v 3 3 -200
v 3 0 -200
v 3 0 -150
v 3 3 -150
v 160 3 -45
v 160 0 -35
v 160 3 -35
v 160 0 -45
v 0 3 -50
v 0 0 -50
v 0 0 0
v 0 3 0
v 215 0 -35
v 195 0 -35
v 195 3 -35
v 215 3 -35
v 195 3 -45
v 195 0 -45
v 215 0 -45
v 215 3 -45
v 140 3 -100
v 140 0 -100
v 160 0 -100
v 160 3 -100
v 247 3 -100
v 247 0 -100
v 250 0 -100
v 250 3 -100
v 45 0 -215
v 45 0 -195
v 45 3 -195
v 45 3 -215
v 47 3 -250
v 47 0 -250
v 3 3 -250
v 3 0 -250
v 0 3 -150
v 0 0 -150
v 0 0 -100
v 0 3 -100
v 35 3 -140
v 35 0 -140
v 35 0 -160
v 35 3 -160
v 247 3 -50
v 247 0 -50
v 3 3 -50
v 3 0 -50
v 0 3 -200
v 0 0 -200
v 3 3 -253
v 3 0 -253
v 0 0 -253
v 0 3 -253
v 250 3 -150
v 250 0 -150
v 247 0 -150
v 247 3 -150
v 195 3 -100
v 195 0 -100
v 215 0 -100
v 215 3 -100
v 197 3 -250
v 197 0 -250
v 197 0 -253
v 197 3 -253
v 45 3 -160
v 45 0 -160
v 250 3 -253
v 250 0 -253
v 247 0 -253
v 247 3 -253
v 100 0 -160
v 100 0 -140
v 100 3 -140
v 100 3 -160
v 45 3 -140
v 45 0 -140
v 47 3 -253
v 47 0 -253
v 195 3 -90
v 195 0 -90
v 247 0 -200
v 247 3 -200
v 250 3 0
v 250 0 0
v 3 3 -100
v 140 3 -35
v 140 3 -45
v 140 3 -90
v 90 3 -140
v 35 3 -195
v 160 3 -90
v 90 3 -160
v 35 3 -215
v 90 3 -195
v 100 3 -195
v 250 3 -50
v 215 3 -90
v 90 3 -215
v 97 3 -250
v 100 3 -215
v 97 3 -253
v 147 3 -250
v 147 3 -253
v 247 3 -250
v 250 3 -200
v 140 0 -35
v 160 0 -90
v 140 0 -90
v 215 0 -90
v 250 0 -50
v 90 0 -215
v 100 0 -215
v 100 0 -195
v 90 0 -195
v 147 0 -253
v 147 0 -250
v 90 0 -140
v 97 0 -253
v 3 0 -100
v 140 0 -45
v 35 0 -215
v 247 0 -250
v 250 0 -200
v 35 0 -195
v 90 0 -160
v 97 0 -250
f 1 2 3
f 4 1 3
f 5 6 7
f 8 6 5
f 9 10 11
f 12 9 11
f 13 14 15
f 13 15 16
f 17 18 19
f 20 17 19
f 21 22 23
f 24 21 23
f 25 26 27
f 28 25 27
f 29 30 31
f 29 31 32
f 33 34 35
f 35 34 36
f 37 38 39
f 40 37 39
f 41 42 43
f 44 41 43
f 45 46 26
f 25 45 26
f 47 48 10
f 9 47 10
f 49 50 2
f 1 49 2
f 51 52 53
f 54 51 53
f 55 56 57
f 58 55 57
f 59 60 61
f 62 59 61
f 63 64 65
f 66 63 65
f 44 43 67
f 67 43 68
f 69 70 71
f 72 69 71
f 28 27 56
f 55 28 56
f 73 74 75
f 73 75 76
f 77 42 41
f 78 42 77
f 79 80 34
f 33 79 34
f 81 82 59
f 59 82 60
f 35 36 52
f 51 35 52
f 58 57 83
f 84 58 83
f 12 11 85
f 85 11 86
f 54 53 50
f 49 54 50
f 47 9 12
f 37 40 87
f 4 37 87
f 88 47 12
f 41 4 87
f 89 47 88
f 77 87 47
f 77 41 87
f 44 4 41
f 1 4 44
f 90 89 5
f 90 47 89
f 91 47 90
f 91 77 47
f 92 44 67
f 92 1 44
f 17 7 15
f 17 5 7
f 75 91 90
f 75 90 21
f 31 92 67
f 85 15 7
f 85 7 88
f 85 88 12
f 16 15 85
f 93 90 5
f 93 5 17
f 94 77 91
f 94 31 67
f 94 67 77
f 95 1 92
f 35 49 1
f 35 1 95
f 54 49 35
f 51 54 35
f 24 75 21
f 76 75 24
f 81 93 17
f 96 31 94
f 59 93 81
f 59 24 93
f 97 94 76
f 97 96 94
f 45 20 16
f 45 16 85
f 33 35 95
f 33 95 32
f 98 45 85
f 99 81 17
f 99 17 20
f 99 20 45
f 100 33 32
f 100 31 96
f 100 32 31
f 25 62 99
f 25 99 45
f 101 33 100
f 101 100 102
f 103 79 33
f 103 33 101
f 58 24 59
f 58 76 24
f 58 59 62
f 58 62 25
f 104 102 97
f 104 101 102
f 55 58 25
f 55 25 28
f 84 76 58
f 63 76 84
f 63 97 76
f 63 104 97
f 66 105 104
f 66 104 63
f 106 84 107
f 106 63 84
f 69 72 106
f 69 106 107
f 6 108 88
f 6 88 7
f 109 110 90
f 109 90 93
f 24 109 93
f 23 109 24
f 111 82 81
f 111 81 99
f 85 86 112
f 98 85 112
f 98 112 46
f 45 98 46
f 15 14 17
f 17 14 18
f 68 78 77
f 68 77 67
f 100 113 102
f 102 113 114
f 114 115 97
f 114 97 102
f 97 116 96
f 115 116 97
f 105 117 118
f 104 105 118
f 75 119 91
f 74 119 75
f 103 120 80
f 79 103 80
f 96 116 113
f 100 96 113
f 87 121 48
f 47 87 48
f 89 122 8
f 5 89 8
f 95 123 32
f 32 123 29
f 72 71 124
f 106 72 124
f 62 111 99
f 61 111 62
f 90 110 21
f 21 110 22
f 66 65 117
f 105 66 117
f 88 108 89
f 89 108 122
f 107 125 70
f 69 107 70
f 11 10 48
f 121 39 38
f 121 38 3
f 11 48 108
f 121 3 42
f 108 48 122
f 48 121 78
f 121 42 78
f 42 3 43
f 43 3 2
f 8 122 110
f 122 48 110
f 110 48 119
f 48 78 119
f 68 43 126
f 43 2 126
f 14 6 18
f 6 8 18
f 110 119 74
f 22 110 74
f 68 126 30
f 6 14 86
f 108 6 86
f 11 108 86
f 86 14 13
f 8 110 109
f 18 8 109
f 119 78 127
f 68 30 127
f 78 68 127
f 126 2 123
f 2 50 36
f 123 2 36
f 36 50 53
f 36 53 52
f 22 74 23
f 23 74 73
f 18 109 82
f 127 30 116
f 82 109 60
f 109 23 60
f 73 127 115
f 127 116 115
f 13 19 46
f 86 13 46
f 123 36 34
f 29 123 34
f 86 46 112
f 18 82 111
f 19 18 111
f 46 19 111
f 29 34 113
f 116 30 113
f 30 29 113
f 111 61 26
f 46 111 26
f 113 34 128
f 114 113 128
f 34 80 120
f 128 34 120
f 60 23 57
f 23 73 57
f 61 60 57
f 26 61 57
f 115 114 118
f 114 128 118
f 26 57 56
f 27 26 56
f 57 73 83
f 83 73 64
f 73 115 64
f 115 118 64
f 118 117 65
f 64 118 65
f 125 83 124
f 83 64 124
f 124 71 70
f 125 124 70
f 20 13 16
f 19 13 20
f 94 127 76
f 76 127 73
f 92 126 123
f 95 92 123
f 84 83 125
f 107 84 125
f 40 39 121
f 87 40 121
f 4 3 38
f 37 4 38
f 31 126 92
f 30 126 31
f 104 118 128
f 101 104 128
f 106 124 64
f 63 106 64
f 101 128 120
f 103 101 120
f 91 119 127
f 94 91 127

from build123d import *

# Parameters (mm, degrees)
SKETCH1_W           = 10
SKETCH1_H           = 20
SKETCH1_W_2         = 20
SKETCH1_H_2         = 10
BOSS_EXTRUDE1_DEPTH = 3


with BuildPart() as part:
    # Sketch1 → Boss-Extrude1 (new body)
    with BuildSketch(Plane(origin=(0, 0, 0), x_dir=(1, 0, 0), z_dir=(0, 1, 0))):
        Polygon((250, 100), (250, 150), (247, 150), (247, 200), (250, 200), (250, 250), (250, 253), (247, 253), (247, 250), (197, 250), (197, 253), (147, 253), (147, 250), (97, 250), (97, 253), (47, 253), (47, 250), (3, 250), (3, 253), (0, 253), (0, 250), (0, 200), (3, 200), (3, 150), (0, 150), (0, 100), (3, 100), (3, 50), (0, 50), (0, 0), (250, 0), (250, 50), (247, 50), (247, 100), align=None)
        with Locations((95, 150)):
            Rectangle(SKETCH1_W, SKETCH1_H, mode=Mode.SUBTRACT)
        with Locations((40, 150)):
            Rectangle(SKETCH1_W, SKETCH1_H, mode=Mode.SUBTRACT)
        with Locations((205, 95)):
            Rectangle(SKETCH1_W_2, SKETCH1_H_2, mode=Mode.SUBTRACT)
        with Locations((205, 40)):
            Rectangle(SKETCH1_W_2, SKETCH1_H_2, mode=Mode.SUBTRACT)
        with Locations((40, 205)):
            Rectangle(SKETCH1_W, SKETCH1_H, mode=Mode.SUBTRACT)
        with Locations((95, 205)):
            Rectangle(SKETCH1_W, SKETCH1_H, mode=Mode.SUBTRACT)
        with Locations((150, 95)):
            Rectangle(SKETCH1_W_2, SKETCH1_H_2, mode=Mode.SUBTRACT)
        with Locations((150, 40)):
            Rectangle(SKETCH1_W_2, SKETCH1_H_2, mode=Mode.SUBTRACT)
    extrude(amount=BOSS_EXTRUDE1_DEPTH)


solid = part.part
